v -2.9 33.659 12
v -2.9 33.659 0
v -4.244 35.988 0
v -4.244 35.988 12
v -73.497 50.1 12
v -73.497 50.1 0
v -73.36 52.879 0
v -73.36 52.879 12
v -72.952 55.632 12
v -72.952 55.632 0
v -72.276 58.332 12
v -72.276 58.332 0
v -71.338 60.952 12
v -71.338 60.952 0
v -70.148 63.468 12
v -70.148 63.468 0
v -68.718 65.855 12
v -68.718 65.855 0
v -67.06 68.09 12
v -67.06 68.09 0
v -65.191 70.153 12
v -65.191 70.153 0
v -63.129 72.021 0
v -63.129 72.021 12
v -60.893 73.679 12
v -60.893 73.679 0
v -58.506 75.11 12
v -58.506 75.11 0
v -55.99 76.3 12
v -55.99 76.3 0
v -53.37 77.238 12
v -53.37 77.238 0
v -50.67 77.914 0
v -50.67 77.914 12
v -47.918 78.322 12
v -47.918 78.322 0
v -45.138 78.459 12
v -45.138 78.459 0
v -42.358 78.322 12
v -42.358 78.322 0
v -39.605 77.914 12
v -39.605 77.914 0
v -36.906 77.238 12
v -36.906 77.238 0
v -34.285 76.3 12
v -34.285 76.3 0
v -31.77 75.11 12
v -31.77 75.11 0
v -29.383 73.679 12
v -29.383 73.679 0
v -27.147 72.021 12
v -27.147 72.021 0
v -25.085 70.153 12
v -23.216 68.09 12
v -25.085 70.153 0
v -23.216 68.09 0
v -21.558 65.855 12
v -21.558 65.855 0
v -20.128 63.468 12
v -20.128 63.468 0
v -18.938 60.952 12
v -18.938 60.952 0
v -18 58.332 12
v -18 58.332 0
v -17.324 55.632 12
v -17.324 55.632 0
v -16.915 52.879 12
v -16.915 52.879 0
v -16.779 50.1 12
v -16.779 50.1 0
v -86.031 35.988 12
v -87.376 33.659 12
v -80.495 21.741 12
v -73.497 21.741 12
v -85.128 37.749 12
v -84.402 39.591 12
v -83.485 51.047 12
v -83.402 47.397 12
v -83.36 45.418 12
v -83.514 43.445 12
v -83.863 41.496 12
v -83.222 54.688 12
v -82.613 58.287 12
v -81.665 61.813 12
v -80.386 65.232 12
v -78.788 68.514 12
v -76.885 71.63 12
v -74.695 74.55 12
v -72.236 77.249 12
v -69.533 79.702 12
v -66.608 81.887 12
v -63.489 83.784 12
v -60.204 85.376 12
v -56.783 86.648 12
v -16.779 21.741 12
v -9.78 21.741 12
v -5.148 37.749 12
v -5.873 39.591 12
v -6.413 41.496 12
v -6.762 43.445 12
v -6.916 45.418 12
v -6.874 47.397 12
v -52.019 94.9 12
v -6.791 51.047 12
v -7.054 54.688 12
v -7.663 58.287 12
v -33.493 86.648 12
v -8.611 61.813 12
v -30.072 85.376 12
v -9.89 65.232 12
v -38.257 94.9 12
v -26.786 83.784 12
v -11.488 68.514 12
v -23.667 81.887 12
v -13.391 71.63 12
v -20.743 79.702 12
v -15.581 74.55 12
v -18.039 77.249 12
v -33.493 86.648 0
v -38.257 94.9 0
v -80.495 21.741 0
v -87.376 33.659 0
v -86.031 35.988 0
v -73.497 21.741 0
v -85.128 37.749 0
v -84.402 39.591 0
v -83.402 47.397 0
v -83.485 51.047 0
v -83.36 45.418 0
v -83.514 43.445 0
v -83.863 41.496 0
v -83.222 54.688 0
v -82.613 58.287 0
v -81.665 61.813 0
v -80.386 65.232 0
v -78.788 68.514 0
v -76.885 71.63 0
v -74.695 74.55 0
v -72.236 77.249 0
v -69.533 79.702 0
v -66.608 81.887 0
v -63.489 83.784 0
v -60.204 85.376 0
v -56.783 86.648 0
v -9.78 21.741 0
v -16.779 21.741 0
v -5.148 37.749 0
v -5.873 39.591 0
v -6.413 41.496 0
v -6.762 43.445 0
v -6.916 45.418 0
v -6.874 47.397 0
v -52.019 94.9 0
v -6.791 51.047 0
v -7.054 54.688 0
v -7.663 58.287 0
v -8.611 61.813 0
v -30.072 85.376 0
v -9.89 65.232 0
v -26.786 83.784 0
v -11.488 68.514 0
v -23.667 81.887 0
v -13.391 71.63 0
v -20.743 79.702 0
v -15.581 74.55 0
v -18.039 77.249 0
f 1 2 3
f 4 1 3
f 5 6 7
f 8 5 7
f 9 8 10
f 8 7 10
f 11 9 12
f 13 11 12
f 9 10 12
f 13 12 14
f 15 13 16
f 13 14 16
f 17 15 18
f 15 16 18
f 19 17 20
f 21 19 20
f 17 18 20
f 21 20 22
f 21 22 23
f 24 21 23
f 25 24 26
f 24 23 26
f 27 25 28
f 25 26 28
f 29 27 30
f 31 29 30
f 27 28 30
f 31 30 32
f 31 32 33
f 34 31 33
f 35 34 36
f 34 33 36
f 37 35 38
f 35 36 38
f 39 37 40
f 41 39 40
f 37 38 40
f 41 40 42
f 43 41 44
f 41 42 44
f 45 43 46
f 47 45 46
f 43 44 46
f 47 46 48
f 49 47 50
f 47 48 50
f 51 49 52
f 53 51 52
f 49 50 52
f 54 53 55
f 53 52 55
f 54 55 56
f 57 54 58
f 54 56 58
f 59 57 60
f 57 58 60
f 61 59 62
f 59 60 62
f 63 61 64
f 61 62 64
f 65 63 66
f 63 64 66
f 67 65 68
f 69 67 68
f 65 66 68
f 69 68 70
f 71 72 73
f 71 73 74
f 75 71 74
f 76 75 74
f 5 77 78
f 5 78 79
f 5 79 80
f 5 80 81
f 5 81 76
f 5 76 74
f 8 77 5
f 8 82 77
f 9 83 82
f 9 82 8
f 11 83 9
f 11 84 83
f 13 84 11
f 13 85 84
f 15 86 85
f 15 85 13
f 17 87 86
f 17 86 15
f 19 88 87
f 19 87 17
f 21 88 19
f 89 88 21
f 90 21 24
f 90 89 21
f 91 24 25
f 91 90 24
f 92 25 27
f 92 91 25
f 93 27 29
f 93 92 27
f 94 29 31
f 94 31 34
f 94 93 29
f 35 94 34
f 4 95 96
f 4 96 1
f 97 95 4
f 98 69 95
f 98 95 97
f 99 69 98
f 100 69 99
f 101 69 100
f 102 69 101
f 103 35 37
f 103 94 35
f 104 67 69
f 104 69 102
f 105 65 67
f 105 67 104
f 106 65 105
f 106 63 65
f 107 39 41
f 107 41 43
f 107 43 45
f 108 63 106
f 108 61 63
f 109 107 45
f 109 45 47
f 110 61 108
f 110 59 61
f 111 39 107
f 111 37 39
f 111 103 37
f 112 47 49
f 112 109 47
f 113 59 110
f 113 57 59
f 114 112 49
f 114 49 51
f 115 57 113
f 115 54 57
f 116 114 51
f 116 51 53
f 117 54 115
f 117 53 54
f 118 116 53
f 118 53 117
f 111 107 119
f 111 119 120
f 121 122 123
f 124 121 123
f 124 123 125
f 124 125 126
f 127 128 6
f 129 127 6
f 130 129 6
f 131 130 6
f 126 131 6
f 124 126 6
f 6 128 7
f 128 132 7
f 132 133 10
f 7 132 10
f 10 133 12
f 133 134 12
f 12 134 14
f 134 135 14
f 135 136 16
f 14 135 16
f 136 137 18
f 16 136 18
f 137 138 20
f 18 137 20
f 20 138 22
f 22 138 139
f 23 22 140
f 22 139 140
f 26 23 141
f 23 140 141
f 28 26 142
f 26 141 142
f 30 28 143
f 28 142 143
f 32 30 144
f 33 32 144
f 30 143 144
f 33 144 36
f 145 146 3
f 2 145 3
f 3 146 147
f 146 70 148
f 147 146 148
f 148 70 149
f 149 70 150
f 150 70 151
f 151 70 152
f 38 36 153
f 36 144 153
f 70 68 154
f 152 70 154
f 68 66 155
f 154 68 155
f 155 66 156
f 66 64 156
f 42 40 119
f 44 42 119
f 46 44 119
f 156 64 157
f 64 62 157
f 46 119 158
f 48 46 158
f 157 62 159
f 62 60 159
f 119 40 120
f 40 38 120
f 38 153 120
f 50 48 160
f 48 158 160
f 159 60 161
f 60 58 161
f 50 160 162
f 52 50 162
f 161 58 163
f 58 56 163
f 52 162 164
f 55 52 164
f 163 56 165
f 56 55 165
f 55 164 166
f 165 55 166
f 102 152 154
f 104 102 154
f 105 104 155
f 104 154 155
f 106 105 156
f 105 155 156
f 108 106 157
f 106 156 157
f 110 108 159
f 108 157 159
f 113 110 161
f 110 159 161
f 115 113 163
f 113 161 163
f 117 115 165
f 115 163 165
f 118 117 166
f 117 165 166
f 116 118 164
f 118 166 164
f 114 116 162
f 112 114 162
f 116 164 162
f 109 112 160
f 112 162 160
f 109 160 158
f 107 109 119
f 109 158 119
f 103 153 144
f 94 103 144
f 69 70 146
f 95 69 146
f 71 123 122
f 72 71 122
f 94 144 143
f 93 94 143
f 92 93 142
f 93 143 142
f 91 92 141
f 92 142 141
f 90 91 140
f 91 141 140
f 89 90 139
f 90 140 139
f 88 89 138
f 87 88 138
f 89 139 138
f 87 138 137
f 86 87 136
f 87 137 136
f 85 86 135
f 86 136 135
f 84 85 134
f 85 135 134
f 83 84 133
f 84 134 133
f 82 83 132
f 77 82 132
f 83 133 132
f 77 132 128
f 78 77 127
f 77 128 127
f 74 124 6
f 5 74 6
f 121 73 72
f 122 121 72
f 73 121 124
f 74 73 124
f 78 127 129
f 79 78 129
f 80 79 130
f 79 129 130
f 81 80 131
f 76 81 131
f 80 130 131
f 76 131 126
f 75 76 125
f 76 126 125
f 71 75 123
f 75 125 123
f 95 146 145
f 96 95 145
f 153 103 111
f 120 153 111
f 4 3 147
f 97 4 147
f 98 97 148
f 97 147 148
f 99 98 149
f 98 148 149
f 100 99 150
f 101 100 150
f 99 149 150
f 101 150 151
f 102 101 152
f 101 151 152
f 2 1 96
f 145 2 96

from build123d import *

# Parameters (mm, degrees)
BOSS_EXTRUDE1_DEPTH = 12
CUT_EXTRUDE1_DEPTH  = 12


with BuildPart() as part:
    # Sketch1 → Boss-Extrude1 (new body)
    with BuildSketch(Plane.XY):
        with BuildLine():
            Line((-45.137913667, 106.817655073), (-56.782603372, 86.648460865))
            ThreePointArc((-56.782603372, 86.648460865), (-76.884990379, 71.629544832), (-83.401578598, 47.397172266))
            ThreePointArc((-83.401578598, 47.397172266), (-83.862908864, 41.49589237), (-86.031372169, 35.98810725))
            Line((-86.031372169, 35.98810725), (-94.257114543, 21.740703527))
            Line((-94.257114543, 21.740703527), (-73.496897515, 21.740703527))
            Line((-73.496897515, 21.740703527), (-73.496897515, 50.099687376))
            ThreePointArc((-73.496897515, 50.099687376), (-45.137913667, 78.458671224), (-16.778929818, 50.099687376))
            Line((-16.778929818, 50.099687376), (-16.778929818, 21.740703527))
            Line((-16.778929818, 21.740703527), (3.98128721, 21.740703527))
            Line((3.98128721, 21.740703527), (-4.244455165, 35.98810725))
            ThreePointArc((-4.244455165, 35.98810725), (-6.412918469, 41.49589237), (-6.874248735, 47.397172266))
            ThreePointArc((-6.874248735, 47.397172266), (-13.390836954, 71.629544832), (-33.493223961, 86.648460865))
            Line((-33.493223961, 86.648460865), (-45.137913667, 106.817655073))
        make_face()
    extrude(amount=BOSS_EXTRUDE1_DEPTH)

    # Sketch2 → Cut-Extrude1 (cut)
    with BuildSketch(Plane.XY.offset(12)):
        Polygon((-52.018755525, 94.899687376), (-38.257071808, 94.899687376), (-45.137913667, 106.817655073), align=None)
        Polygon((-80.495430827, 21.740703527), (-87.376272685, 33.658671224), (-94.257114543, 21.740703527), align=None)
        Polygon((-2.899554648, 33.658671224), (-9.780396506, 21.740703527), (3.98128721, 21.740703527), align=None)
    extrude(amount=-CUT_EXTRUDE1_DEPTH, mode=Mode.SUBTRACT)


solid = part.part
